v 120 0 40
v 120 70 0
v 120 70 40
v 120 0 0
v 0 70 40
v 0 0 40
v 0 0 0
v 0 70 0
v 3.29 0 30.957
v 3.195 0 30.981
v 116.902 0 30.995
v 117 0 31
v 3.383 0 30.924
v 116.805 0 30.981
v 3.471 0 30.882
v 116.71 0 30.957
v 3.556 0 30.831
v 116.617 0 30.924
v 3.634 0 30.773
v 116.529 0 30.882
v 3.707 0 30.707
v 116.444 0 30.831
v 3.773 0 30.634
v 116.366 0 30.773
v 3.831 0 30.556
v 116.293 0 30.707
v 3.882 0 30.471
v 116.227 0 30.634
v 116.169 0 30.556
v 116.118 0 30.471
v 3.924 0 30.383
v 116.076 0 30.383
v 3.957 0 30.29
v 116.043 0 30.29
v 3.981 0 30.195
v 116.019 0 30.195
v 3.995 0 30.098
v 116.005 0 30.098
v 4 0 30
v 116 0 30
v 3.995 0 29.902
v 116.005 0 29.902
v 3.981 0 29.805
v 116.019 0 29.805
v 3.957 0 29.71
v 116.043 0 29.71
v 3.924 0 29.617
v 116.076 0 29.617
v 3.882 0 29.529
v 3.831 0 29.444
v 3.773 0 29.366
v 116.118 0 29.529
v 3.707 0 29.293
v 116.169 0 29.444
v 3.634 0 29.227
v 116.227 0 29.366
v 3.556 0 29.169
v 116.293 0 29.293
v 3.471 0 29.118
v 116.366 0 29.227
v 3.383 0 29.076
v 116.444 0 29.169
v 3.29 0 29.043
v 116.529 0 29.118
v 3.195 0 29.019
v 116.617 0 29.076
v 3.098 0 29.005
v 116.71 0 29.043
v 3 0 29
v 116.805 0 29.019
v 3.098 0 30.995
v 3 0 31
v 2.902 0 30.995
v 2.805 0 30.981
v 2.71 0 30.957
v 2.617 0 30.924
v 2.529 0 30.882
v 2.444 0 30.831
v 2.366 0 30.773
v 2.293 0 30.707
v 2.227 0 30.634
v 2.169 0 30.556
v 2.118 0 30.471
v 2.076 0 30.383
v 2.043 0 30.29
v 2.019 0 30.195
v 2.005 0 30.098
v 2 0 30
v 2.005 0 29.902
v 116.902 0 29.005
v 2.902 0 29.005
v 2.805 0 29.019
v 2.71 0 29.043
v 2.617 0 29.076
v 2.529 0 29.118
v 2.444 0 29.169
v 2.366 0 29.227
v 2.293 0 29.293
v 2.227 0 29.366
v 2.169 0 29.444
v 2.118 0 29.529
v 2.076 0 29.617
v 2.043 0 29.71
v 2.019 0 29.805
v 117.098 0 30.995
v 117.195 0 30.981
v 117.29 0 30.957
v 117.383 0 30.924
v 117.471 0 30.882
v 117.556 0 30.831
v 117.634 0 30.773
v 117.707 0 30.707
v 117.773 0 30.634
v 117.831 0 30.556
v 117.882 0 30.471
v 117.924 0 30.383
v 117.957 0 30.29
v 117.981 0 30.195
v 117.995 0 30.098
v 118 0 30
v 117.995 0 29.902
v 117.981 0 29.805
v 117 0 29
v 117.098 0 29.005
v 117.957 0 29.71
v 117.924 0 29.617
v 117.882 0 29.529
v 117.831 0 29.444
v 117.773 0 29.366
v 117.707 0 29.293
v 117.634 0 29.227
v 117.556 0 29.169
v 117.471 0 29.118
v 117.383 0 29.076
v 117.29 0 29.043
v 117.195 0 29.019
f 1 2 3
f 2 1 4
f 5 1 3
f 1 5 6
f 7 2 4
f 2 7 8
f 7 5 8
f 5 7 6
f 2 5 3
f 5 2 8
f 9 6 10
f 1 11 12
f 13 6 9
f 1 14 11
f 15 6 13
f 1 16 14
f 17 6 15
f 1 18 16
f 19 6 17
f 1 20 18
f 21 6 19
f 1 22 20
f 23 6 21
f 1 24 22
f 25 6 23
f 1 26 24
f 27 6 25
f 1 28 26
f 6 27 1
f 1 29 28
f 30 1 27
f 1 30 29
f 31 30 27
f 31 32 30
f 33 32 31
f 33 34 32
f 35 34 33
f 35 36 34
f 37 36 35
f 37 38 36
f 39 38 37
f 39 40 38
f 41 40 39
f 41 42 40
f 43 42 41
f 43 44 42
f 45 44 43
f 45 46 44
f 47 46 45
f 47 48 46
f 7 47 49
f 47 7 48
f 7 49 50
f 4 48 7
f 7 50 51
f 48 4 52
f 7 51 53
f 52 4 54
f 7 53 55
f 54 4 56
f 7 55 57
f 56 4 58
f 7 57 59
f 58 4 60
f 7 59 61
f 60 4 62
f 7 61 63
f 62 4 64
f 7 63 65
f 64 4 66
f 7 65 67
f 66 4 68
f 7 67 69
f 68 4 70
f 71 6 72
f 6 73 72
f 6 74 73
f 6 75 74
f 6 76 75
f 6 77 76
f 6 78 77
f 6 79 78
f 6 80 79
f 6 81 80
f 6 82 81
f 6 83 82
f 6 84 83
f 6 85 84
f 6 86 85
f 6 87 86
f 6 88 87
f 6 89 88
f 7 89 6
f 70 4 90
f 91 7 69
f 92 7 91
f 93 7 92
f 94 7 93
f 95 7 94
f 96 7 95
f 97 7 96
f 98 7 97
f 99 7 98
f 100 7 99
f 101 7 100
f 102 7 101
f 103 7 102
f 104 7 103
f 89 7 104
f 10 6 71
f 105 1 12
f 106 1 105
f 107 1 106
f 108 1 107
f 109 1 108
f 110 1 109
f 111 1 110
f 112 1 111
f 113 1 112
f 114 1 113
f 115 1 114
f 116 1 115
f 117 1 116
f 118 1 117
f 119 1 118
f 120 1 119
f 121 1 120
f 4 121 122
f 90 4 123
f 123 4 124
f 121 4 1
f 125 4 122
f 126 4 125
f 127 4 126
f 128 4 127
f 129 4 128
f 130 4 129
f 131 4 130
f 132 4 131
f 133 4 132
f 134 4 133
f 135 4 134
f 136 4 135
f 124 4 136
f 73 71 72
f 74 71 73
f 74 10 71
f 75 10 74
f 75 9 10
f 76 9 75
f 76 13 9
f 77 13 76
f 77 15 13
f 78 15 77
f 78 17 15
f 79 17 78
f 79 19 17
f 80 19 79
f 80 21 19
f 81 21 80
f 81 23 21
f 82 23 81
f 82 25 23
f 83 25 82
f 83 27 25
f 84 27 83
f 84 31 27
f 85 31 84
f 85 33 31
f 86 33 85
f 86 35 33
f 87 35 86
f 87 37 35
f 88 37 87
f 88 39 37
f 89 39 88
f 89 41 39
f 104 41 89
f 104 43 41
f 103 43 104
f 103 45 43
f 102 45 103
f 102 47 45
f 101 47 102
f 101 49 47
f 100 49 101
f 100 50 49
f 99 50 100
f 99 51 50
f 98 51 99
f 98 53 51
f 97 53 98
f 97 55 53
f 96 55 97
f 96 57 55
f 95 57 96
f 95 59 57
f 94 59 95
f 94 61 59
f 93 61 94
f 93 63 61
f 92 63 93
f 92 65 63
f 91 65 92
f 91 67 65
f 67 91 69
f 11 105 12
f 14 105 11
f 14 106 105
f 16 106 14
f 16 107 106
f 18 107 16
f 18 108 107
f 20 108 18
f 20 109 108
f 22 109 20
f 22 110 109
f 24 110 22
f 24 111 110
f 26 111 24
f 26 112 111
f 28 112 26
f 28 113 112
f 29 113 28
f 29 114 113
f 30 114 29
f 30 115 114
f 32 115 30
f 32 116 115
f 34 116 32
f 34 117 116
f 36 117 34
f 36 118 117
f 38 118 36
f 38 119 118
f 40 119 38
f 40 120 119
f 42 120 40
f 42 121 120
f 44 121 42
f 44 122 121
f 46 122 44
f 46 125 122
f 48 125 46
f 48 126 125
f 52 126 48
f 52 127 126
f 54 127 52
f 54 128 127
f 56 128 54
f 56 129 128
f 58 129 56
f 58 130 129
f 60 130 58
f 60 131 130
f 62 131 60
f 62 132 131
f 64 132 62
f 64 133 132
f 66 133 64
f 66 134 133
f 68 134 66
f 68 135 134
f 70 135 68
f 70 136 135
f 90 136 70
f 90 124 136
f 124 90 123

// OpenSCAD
// Mini Horizontal Gel Electrophoresis Buffer Tank
// Outer dimensions: 120 (X) x 70 (Y) x 40 (Z)
// Wall thickness: 3 mm
// Floor thickness: 3 mm
// Inner platform: 60 (X) x 70 (Y) x 10 (height above inner floor)
// Electrode holes: 2 mm diameter, horizontal along X, at Y=0, Z=30

$fn = 64;

// Outer Dimensions
X_out = 120;
Y_out = 70;
Z_out = 40;

// Wall Thickness
wall = 3;

// Floor Thickness
floor_t = 3;

// Inner Dimensions
X_in  = X_out - 2 * wall;
Y_in  = Y_out - 2 * wall;
Z_in  = Z_out - floor_t; 

// Platform Dimensions
plat_len = 60; 
plat_w   = Y_in; 
plat_h   = 10;  // Height above inner floor

// Electrode Hole Specs
hole_d   = 2;
hole_z   = 30;  // Z coordinate of the hole center

// Main assembly
difference() {
    union() {
        // 1. Tank Shell
        translate([0, 0, 0]) cube([X_out, Y_out, Z_out]);
        
        // 2. Cut inner volume (air space)
        // Starts at Z = floor_t
        translate([wall, wall, floor_t]) cube([X_in, Y_in, Z_in]);
        
        // 3. Platform
        // Sits on the inner floor (Z = floor_t)
        // Top of platform = floor_t + plat_h = 3 + 10 = 13 mm
        translate([
            (X_out - plat_len) / 2, 
            0, 
            floor_t
        ]) 
        cube([plat_len, plat_w, plat_h]);
    }
    
    // 4. Electrode Holes
    // Two holes, one at each end wall (X=wall and X=X_out-wall)
    // Both centered at Y=0, Z=30
    // Holes run along X axis
    
    // Left Wall Hole
    translate([wall, 0, hole_z]) {
        rotate([90, 0, 0]) cylinder(h = wall + 1, d = hole_d);
    }
    
    // Right Wall Hole
    translate([X_out - wall, 0, hole_z]) {
        rotate([90, 0, 0]) cylinder(h = wall + 1, d = hole_d);
    }
}
